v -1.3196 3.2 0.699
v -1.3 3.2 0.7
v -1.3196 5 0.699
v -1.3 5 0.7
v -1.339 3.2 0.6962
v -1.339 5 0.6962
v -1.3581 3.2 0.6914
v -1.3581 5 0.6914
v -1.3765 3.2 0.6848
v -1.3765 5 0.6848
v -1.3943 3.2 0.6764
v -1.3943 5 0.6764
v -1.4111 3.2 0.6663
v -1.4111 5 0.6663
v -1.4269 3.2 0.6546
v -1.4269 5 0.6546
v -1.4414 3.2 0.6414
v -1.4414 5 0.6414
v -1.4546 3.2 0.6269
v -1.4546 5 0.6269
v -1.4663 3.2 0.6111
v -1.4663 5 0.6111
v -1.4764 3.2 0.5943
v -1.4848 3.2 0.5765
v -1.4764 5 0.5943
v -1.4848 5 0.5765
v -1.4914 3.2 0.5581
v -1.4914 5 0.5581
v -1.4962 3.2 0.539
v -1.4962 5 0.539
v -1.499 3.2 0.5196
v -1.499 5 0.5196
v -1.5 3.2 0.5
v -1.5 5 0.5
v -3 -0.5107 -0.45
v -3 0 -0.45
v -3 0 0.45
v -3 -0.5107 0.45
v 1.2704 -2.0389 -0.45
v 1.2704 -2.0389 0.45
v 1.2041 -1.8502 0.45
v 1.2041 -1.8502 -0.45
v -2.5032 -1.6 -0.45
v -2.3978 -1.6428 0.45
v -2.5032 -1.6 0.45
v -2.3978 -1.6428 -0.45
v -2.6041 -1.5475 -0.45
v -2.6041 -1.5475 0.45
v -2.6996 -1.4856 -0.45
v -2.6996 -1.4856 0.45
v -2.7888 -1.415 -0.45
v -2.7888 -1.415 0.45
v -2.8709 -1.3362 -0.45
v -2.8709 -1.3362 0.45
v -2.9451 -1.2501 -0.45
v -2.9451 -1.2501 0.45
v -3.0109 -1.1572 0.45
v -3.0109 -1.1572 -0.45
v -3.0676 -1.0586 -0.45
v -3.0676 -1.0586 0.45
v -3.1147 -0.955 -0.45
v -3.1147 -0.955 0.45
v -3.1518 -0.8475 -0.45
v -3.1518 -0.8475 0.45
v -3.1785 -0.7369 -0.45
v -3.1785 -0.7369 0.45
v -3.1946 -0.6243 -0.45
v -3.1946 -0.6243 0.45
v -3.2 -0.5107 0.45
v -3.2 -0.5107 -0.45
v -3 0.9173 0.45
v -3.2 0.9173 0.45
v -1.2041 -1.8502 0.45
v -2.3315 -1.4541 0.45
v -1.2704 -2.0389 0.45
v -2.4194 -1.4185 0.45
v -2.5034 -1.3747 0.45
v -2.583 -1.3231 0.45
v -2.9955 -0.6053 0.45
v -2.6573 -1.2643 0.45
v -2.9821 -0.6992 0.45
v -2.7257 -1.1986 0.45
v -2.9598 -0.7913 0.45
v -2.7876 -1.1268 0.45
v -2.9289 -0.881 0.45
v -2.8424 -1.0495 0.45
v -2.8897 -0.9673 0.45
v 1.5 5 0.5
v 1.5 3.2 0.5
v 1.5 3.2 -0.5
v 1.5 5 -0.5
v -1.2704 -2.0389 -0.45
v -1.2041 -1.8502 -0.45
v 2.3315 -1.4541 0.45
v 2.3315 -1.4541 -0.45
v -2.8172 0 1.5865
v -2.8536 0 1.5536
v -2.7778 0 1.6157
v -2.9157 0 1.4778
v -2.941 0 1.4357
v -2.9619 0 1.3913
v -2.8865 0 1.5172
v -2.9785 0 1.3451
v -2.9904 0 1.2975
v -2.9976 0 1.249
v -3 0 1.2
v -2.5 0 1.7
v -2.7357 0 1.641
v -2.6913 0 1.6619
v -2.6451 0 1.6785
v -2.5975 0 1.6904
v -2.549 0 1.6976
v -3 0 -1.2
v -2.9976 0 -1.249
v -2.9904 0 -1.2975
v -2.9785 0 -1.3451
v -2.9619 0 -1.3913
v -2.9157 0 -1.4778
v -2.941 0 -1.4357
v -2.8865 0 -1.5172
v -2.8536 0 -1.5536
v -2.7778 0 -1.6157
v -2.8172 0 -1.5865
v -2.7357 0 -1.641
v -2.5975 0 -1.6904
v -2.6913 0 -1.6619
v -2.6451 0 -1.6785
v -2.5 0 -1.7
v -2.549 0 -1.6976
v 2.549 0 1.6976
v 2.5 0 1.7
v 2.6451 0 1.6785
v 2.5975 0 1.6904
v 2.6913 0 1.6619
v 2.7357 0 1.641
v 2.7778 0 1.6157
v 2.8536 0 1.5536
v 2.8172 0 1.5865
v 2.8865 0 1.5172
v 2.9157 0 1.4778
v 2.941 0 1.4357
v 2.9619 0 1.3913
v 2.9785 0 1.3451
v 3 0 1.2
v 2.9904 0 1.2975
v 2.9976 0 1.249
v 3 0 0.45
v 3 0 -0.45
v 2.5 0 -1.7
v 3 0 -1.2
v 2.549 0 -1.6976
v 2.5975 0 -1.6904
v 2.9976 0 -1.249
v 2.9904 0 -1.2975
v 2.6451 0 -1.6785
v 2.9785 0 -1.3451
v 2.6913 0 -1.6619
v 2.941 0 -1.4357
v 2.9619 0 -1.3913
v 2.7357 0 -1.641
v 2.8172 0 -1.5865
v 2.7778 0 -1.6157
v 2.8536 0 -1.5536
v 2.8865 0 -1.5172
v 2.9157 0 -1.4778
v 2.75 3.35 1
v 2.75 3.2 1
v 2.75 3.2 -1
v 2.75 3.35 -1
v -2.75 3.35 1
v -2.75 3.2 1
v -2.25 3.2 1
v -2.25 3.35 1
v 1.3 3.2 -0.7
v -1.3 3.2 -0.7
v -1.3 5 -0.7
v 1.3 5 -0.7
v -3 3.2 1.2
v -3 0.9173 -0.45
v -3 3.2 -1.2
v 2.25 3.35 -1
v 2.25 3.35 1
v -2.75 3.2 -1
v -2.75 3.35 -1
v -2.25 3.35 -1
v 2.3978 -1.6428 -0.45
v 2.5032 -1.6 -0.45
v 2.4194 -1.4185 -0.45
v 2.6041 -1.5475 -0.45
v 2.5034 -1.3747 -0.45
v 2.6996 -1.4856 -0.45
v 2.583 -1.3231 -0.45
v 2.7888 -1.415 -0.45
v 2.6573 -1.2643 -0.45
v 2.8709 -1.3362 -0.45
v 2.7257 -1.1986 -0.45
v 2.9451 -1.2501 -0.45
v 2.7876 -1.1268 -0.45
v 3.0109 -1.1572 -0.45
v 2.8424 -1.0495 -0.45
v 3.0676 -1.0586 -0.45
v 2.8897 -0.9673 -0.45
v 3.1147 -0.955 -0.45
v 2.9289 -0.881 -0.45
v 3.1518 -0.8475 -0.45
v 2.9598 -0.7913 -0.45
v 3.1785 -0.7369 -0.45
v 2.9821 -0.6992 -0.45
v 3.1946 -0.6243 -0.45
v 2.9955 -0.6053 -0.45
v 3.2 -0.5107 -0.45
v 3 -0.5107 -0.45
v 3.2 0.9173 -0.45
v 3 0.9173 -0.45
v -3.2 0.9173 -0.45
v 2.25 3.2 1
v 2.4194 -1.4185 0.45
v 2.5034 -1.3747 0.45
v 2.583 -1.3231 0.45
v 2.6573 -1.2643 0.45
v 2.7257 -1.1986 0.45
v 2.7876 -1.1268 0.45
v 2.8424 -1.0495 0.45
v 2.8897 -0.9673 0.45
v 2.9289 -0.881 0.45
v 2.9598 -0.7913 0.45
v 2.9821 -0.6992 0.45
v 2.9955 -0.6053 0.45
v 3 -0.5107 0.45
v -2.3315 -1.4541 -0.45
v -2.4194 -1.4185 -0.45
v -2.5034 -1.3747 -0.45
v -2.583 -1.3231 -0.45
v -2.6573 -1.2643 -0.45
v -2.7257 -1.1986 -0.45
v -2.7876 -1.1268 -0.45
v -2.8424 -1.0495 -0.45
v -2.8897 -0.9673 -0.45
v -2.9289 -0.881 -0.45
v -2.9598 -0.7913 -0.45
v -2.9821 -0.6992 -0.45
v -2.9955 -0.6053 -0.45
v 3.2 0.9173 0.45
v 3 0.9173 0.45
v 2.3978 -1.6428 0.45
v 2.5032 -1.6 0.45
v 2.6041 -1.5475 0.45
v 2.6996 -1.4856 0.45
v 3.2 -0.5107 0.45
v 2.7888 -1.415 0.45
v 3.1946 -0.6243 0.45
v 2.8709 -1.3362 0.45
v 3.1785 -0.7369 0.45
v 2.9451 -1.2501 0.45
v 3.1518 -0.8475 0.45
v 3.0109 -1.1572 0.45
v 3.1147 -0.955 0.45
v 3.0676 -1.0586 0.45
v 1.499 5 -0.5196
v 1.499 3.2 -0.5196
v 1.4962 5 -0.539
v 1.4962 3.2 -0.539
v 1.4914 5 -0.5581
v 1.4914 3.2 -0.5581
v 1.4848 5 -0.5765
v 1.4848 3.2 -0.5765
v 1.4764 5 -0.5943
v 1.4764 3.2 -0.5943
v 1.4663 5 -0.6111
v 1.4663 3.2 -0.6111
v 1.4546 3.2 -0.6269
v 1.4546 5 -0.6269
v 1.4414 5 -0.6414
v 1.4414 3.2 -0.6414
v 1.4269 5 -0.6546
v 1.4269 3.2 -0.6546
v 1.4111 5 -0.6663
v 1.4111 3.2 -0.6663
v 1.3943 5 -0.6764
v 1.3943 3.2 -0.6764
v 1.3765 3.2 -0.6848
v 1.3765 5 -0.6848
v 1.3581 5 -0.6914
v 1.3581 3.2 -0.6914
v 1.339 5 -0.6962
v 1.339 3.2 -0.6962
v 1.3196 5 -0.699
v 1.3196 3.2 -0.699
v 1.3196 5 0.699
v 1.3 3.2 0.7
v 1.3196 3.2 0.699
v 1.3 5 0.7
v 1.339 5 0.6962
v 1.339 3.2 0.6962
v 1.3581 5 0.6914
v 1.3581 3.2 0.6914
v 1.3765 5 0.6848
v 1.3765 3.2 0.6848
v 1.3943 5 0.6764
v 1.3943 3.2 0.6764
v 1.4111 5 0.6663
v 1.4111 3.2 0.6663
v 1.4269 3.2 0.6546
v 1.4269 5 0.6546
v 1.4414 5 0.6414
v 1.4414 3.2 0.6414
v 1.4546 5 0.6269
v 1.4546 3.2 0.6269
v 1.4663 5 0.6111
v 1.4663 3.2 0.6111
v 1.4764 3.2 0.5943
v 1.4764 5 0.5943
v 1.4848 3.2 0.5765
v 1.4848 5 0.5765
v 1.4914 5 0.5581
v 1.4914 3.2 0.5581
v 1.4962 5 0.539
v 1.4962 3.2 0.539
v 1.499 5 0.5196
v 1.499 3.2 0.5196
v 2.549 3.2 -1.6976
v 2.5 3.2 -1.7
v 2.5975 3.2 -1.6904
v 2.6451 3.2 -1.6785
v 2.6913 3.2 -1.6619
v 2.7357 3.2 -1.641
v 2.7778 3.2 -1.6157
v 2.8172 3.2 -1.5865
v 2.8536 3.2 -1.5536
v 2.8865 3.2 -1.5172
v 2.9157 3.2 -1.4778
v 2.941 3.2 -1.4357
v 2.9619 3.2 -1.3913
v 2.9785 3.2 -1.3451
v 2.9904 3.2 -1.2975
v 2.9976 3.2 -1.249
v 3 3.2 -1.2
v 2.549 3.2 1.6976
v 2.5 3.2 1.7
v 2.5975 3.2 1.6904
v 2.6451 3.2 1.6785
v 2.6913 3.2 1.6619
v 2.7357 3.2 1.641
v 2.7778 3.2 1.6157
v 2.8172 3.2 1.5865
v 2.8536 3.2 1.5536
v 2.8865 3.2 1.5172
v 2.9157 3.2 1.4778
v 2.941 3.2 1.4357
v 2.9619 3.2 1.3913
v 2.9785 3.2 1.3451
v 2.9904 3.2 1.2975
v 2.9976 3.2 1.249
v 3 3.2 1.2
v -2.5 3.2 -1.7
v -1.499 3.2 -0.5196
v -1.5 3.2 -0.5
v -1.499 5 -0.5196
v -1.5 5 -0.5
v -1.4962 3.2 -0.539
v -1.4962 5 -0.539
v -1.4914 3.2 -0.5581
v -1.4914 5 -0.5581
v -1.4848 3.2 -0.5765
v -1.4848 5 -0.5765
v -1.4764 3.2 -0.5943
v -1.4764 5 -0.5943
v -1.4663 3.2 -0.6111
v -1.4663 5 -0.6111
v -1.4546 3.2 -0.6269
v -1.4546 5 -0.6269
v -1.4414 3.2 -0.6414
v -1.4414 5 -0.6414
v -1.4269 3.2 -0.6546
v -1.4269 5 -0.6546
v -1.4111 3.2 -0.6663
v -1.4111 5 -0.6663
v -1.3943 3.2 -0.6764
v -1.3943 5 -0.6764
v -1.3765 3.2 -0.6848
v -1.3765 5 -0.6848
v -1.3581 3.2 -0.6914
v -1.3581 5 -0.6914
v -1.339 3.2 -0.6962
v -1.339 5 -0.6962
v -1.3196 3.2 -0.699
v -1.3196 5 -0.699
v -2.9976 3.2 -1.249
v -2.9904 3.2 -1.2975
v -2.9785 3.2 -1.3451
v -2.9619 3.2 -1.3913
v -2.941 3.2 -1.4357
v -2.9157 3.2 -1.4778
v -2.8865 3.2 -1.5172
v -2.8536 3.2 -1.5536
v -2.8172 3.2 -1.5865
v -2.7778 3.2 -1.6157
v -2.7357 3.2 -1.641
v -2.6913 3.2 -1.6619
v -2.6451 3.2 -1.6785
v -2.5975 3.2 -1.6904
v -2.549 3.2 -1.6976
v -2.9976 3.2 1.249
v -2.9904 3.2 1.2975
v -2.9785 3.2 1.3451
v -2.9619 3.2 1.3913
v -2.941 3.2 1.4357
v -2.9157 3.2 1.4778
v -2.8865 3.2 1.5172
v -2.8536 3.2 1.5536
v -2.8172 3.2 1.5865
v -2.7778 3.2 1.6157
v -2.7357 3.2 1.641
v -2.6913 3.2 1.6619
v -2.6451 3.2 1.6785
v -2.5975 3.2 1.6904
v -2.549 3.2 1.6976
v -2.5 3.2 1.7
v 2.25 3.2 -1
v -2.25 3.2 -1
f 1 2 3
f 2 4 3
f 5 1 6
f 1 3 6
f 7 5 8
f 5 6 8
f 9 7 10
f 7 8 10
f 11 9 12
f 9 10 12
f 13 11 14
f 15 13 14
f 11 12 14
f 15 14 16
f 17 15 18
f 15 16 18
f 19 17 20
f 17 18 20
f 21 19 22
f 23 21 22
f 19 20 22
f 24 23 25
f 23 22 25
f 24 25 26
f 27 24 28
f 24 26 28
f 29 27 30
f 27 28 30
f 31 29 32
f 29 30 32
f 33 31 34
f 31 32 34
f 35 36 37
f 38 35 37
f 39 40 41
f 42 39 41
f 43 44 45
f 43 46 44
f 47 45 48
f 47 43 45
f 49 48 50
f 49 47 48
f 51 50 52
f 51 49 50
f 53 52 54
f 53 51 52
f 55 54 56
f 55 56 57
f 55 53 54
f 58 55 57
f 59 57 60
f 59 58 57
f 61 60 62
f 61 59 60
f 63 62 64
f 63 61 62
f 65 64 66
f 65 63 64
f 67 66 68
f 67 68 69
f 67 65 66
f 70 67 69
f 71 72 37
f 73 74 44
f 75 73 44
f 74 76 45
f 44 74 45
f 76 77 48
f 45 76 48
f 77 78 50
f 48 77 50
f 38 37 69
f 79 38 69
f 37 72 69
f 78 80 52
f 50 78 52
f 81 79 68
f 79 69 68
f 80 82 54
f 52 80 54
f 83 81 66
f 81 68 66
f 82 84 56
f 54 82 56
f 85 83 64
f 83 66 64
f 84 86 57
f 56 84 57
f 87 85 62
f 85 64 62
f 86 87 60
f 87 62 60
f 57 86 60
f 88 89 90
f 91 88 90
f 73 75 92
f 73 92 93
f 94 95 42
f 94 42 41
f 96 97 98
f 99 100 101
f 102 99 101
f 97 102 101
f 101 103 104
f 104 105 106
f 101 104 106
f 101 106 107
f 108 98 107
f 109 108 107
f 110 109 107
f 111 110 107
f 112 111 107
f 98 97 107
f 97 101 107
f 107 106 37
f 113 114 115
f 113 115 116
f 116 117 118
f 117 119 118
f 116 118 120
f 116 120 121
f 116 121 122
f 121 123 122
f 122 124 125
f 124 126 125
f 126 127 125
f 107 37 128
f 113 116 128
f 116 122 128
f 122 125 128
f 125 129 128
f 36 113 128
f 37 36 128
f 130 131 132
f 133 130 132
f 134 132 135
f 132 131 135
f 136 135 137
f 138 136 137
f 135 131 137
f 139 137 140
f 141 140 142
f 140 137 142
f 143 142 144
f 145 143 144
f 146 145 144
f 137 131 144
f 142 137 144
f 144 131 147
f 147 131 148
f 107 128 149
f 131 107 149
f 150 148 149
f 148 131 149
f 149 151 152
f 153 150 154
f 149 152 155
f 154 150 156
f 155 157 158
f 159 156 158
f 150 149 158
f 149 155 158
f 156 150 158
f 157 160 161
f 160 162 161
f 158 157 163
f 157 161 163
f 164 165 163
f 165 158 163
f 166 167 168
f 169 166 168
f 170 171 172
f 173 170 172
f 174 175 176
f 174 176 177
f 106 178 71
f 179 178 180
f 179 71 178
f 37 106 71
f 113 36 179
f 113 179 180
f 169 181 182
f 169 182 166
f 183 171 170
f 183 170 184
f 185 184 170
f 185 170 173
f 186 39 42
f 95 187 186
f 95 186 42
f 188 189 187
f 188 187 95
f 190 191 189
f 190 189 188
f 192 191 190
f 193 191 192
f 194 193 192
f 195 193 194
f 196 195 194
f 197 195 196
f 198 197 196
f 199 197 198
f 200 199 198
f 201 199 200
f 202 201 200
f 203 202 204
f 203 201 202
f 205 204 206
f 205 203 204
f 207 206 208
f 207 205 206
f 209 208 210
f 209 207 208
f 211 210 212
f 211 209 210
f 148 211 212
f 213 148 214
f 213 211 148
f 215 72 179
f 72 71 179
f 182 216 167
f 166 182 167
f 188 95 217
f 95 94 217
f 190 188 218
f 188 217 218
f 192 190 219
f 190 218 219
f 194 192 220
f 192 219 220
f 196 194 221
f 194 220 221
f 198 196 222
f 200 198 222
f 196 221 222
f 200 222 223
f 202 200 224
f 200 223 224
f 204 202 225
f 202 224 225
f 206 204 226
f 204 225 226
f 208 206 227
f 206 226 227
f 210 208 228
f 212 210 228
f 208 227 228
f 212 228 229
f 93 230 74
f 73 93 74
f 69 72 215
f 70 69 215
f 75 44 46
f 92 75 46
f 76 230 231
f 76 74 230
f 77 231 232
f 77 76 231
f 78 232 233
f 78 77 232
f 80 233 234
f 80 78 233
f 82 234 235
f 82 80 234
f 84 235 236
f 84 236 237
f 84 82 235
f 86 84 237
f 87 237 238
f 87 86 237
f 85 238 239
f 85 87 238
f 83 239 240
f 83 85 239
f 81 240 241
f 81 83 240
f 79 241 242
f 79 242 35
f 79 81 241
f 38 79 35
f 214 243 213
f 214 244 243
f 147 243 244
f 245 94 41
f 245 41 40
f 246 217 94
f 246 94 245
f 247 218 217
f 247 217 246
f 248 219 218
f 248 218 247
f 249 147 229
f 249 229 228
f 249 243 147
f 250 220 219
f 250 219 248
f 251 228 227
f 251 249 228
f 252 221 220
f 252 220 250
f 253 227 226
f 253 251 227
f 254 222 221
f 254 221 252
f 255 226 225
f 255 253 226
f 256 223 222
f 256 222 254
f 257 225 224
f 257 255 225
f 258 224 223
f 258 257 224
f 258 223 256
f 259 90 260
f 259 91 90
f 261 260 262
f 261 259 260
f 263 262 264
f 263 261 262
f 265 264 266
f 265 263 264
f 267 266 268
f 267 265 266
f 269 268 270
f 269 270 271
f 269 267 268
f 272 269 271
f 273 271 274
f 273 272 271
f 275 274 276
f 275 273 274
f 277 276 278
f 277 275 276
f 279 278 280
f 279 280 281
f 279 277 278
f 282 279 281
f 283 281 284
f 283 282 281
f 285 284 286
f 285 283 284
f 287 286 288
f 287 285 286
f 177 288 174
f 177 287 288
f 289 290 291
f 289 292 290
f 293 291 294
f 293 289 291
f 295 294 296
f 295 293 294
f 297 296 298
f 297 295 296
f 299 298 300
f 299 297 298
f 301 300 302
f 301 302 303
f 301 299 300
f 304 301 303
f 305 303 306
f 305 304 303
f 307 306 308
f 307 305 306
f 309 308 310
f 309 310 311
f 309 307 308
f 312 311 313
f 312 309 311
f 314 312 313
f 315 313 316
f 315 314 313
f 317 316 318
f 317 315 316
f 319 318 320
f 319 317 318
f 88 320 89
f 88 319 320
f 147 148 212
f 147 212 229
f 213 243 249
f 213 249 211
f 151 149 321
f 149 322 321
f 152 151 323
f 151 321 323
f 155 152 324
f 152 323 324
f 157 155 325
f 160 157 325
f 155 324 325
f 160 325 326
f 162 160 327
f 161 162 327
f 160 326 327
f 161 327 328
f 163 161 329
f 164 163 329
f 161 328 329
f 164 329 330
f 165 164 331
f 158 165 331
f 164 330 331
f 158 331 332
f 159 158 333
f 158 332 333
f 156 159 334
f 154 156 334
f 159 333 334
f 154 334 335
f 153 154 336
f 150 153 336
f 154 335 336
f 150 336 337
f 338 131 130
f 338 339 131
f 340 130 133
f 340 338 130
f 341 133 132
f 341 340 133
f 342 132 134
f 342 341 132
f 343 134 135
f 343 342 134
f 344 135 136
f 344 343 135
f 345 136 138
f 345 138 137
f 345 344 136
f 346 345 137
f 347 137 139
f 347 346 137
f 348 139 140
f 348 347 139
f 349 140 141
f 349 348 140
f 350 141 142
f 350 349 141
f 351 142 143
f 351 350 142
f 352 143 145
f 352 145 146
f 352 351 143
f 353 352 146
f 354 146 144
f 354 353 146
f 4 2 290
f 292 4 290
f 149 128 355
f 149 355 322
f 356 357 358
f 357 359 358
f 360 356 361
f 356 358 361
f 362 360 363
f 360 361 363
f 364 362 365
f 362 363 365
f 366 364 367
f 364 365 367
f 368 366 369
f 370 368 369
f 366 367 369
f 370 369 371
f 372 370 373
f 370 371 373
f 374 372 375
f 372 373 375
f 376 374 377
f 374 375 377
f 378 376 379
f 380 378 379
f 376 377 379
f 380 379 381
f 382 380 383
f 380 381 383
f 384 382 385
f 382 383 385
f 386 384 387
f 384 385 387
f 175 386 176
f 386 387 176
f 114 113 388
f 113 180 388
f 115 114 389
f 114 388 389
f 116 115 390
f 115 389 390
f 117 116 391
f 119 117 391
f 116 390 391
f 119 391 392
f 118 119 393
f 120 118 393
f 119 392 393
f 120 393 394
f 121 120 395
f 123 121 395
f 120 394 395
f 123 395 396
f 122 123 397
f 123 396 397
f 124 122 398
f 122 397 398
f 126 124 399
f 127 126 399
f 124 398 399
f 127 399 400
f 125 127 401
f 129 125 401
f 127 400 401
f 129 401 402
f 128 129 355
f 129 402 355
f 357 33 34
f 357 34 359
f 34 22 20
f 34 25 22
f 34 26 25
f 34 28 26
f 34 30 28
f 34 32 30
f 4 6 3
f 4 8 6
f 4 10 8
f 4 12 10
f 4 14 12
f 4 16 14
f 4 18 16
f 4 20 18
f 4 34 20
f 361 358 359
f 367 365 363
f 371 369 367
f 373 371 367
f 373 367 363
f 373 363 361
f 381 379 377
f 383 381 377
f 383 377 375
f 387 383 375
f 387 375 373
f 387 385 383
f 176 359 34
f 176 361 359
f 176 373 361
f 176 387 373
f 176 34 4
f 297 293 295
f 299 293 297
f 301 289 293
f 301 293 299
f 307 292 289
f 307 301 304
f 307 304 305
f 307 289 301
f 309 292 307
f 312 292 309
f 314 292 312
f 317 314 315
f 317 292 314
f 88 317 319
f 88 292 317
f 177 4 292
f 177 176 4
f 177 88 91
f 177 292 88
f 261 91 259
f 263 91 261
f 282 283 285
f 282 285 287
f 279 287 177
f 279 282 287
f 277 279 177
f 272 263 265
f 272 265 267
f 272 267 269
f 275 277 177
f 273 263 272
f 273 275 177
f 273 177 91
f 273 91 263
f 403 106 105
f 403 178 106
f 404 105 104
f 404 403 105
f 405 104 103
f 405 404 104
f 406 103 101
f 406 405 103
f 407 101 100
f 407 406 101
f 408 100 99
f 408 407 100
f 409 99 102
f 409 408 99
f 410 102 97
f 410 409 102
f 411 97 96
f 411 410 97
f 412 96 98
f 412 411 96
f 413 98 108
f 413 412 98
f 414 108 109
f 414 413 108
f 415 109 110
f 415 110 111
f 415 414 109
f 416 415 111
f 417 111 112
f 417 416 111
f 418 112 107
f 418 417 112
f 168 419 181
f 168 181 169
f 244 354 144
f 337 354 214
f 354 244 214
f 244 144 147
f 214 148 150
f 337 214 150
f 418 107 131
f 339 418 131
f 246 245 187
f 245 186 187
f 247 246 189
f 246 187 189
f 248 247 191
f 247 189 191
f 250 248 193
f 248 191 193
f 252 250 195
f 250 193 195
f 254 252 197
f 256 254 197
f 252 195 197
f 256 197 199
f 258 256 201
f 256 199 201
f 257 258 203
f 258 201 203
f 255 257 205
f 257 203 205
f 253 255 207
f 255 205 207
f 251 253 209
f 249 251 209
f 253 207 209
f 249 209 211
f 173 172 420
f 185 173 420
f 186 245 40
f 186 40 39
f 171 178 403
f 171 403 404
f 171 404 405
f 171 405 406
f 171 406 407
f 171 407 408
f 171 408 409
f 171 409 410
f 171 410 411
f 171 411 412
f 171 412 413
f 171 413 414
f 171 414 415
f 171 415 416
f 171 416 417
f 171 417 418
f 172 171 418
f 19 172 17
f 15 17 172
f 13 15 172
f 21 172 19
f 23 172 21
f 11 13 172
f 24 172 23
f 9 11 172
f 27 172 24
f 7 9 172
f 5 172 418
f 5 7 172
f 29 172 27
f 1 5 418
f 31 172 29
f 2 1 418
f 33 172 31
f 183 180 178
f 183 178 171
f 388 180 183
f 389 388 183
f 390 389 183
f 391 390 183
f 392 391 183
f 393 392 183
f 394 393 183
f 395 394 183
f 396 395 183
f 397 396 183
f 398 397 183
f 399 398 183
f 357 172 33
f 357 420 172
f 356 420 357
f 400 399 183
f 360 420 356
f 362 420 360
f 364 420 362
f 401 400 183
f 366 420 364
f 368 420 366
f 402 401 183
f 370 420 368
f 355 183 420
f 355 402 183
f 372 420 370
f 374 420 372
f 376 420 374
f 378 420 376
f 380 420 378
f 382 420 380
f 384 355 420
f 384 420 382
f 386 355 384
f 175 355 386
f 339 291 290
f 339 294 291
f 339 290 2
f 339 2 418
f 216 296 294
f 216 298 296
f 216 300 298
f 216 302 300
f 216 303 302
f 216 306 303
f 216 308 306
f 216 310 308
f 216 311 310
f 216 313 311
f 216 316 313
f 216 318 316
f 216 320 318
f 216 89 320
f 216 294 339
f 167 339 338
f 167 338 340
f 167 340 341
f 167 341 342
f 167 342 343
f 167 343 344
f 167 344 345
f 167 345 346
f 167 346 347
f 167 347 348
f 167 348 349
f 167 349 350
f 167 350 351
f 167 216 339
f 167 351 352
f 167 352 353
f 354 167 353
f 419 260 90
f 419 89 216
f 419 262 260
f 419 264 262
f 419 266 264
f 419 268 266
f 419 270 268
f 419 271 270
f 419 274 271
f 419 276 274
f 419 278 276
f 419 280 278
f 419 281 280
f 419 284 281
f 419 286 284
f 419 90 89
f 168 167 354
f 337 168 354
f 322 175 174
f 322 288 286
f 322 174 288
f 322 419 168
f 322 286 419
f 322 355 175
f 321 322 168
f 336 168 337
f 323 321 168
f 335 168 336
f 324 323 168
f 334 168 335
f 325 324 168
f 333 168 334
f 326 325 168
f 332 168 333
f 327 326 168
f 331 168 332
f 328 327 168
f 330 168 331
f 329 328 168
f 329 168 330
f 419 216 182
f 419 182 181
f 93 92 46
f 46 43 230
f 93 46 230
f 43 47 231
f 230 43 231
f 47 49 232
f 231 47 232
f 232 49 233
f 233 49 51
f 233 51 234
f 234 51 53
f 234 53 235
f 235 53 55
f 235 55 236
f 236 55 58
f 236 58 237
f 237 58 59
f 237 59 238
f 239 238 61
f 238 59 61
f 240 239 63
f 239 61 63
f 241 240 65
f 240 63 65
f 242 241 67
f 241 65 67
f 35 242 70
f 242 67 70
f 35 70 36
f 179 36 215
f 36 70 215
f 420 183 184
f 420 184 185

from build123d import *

# Parameters (mm, degrees)
SKETCH1_W           = 6
SKETCH1_H           = 3.4
BOSS_EXTRUDE1_DEPTH = 3.2
SKETCH2_W           = 3
SKETCH2_H           = 1.4
BOSS_EXTRUDE2_DEPTH = 1.8
SKETCH2_3_W         = 0.5
SKETCH2_3_H         = 2
BOSS_EXTRUDE3_DEPTH = 0.15
FILLET1_R           = 0.2
FILLET3_R           = 0.5
SKETCH3_W           = 0.2
SKETCH3_H           = 0.9


with BuildPart() as part:
    # Sketch1 → Boss-Extrude1 (new body)
    with BuildSketch(Plane(origin=(0, 0, 0), x_dir=(1, 0, 0), z_dir=(0, 1, 0))):
        Rectangle(SKETCH1_W, SKETCH1_H)
    extrude(amount=BOSS_EXTRUDE1_DEPTH)

    # Sketch2 → Boss-Extrude2 (add)
    with BuildSketch(Plane(origin=(0, 3.2, 0), x_dir=(1, 0, 0), z_dir=(0, 1, 0))):
        Rectangle(SKETCH2_W, SKETCH2_H)
    extrude(amount=BOSS_EXTRUDE2_DEPTH)

    # Sketch2<3> → Boss-Extrude3 (add)
    with BuildSketch(Plane(origin=(0, 3.2, 0), x_dir=(1, 0, 0), z_dir=(0, 1, 0))):
        with Locations((-2.5, 0)):
            Rectangle(SKETCH2_3_W, SKETCH2_3_H)
        with Locations((2.5, 0)):
            Rectangle(SKETCH2_3_W, SKETCH2_3_H)
    extrude(amount=BOSS_EXTRUDE3_DEPTH)

    # Fillet1
    fillet1_edges = [part.edges().sort_by_distance(p)[0] for p in [
        (-1.5, 4.1, -0.7),
        (-1.5, 4.1, 0.7),
        (1.5, 4.1, 0.7),
        (1.5, 4.1, -0.7),
    ]]
    fillet(fillet1_edges, radius=FILLET1_R)

    # Fillet3
    fillet3_edges = [part.edges().sort_by_distance(p)[0] for p in [
        (-3, 1.6, -1.7),
        (3, 1.6, -1.7),
        (3, 1.6, 1.7),
        (-3, 1.6, 1.7),
    ]]
    fillet(fillet3_edges, radius=FILLET3_R)

    # Sweep1: sweep along a path in Sketch4
    with BuildLine(Plane.XY) as sweep1_path:
        Line((-1.204114161, -1.850245601), (-2.331506907, -1.454106562))
        ThreePointArc((-2.331506907, -1.454106562), (-2.815937163, -1.088794364), (-3, -0.51065377))
        Line((-3, -0.51065377), (-3, 0))
        Line((-3, 0), (-3, 0.917319166))
    # Sketch3 → Sweep1 (sweep)
    with BuildSketch(Plane.XZ):
        with Locations((-3.1, 0)):
            Rectangle(SKETCH3_W, SKETCH3_H)
    sweep1 = sweep(path=sweep1_path.line)

    # Mirror1: Sweep1 across plane
    add(sweep1.mirror(Plane(origin=(0, 0, 0), x_dir=(0, 0, 1), z_dir=(1, 0, 0))))


solid = part.part
